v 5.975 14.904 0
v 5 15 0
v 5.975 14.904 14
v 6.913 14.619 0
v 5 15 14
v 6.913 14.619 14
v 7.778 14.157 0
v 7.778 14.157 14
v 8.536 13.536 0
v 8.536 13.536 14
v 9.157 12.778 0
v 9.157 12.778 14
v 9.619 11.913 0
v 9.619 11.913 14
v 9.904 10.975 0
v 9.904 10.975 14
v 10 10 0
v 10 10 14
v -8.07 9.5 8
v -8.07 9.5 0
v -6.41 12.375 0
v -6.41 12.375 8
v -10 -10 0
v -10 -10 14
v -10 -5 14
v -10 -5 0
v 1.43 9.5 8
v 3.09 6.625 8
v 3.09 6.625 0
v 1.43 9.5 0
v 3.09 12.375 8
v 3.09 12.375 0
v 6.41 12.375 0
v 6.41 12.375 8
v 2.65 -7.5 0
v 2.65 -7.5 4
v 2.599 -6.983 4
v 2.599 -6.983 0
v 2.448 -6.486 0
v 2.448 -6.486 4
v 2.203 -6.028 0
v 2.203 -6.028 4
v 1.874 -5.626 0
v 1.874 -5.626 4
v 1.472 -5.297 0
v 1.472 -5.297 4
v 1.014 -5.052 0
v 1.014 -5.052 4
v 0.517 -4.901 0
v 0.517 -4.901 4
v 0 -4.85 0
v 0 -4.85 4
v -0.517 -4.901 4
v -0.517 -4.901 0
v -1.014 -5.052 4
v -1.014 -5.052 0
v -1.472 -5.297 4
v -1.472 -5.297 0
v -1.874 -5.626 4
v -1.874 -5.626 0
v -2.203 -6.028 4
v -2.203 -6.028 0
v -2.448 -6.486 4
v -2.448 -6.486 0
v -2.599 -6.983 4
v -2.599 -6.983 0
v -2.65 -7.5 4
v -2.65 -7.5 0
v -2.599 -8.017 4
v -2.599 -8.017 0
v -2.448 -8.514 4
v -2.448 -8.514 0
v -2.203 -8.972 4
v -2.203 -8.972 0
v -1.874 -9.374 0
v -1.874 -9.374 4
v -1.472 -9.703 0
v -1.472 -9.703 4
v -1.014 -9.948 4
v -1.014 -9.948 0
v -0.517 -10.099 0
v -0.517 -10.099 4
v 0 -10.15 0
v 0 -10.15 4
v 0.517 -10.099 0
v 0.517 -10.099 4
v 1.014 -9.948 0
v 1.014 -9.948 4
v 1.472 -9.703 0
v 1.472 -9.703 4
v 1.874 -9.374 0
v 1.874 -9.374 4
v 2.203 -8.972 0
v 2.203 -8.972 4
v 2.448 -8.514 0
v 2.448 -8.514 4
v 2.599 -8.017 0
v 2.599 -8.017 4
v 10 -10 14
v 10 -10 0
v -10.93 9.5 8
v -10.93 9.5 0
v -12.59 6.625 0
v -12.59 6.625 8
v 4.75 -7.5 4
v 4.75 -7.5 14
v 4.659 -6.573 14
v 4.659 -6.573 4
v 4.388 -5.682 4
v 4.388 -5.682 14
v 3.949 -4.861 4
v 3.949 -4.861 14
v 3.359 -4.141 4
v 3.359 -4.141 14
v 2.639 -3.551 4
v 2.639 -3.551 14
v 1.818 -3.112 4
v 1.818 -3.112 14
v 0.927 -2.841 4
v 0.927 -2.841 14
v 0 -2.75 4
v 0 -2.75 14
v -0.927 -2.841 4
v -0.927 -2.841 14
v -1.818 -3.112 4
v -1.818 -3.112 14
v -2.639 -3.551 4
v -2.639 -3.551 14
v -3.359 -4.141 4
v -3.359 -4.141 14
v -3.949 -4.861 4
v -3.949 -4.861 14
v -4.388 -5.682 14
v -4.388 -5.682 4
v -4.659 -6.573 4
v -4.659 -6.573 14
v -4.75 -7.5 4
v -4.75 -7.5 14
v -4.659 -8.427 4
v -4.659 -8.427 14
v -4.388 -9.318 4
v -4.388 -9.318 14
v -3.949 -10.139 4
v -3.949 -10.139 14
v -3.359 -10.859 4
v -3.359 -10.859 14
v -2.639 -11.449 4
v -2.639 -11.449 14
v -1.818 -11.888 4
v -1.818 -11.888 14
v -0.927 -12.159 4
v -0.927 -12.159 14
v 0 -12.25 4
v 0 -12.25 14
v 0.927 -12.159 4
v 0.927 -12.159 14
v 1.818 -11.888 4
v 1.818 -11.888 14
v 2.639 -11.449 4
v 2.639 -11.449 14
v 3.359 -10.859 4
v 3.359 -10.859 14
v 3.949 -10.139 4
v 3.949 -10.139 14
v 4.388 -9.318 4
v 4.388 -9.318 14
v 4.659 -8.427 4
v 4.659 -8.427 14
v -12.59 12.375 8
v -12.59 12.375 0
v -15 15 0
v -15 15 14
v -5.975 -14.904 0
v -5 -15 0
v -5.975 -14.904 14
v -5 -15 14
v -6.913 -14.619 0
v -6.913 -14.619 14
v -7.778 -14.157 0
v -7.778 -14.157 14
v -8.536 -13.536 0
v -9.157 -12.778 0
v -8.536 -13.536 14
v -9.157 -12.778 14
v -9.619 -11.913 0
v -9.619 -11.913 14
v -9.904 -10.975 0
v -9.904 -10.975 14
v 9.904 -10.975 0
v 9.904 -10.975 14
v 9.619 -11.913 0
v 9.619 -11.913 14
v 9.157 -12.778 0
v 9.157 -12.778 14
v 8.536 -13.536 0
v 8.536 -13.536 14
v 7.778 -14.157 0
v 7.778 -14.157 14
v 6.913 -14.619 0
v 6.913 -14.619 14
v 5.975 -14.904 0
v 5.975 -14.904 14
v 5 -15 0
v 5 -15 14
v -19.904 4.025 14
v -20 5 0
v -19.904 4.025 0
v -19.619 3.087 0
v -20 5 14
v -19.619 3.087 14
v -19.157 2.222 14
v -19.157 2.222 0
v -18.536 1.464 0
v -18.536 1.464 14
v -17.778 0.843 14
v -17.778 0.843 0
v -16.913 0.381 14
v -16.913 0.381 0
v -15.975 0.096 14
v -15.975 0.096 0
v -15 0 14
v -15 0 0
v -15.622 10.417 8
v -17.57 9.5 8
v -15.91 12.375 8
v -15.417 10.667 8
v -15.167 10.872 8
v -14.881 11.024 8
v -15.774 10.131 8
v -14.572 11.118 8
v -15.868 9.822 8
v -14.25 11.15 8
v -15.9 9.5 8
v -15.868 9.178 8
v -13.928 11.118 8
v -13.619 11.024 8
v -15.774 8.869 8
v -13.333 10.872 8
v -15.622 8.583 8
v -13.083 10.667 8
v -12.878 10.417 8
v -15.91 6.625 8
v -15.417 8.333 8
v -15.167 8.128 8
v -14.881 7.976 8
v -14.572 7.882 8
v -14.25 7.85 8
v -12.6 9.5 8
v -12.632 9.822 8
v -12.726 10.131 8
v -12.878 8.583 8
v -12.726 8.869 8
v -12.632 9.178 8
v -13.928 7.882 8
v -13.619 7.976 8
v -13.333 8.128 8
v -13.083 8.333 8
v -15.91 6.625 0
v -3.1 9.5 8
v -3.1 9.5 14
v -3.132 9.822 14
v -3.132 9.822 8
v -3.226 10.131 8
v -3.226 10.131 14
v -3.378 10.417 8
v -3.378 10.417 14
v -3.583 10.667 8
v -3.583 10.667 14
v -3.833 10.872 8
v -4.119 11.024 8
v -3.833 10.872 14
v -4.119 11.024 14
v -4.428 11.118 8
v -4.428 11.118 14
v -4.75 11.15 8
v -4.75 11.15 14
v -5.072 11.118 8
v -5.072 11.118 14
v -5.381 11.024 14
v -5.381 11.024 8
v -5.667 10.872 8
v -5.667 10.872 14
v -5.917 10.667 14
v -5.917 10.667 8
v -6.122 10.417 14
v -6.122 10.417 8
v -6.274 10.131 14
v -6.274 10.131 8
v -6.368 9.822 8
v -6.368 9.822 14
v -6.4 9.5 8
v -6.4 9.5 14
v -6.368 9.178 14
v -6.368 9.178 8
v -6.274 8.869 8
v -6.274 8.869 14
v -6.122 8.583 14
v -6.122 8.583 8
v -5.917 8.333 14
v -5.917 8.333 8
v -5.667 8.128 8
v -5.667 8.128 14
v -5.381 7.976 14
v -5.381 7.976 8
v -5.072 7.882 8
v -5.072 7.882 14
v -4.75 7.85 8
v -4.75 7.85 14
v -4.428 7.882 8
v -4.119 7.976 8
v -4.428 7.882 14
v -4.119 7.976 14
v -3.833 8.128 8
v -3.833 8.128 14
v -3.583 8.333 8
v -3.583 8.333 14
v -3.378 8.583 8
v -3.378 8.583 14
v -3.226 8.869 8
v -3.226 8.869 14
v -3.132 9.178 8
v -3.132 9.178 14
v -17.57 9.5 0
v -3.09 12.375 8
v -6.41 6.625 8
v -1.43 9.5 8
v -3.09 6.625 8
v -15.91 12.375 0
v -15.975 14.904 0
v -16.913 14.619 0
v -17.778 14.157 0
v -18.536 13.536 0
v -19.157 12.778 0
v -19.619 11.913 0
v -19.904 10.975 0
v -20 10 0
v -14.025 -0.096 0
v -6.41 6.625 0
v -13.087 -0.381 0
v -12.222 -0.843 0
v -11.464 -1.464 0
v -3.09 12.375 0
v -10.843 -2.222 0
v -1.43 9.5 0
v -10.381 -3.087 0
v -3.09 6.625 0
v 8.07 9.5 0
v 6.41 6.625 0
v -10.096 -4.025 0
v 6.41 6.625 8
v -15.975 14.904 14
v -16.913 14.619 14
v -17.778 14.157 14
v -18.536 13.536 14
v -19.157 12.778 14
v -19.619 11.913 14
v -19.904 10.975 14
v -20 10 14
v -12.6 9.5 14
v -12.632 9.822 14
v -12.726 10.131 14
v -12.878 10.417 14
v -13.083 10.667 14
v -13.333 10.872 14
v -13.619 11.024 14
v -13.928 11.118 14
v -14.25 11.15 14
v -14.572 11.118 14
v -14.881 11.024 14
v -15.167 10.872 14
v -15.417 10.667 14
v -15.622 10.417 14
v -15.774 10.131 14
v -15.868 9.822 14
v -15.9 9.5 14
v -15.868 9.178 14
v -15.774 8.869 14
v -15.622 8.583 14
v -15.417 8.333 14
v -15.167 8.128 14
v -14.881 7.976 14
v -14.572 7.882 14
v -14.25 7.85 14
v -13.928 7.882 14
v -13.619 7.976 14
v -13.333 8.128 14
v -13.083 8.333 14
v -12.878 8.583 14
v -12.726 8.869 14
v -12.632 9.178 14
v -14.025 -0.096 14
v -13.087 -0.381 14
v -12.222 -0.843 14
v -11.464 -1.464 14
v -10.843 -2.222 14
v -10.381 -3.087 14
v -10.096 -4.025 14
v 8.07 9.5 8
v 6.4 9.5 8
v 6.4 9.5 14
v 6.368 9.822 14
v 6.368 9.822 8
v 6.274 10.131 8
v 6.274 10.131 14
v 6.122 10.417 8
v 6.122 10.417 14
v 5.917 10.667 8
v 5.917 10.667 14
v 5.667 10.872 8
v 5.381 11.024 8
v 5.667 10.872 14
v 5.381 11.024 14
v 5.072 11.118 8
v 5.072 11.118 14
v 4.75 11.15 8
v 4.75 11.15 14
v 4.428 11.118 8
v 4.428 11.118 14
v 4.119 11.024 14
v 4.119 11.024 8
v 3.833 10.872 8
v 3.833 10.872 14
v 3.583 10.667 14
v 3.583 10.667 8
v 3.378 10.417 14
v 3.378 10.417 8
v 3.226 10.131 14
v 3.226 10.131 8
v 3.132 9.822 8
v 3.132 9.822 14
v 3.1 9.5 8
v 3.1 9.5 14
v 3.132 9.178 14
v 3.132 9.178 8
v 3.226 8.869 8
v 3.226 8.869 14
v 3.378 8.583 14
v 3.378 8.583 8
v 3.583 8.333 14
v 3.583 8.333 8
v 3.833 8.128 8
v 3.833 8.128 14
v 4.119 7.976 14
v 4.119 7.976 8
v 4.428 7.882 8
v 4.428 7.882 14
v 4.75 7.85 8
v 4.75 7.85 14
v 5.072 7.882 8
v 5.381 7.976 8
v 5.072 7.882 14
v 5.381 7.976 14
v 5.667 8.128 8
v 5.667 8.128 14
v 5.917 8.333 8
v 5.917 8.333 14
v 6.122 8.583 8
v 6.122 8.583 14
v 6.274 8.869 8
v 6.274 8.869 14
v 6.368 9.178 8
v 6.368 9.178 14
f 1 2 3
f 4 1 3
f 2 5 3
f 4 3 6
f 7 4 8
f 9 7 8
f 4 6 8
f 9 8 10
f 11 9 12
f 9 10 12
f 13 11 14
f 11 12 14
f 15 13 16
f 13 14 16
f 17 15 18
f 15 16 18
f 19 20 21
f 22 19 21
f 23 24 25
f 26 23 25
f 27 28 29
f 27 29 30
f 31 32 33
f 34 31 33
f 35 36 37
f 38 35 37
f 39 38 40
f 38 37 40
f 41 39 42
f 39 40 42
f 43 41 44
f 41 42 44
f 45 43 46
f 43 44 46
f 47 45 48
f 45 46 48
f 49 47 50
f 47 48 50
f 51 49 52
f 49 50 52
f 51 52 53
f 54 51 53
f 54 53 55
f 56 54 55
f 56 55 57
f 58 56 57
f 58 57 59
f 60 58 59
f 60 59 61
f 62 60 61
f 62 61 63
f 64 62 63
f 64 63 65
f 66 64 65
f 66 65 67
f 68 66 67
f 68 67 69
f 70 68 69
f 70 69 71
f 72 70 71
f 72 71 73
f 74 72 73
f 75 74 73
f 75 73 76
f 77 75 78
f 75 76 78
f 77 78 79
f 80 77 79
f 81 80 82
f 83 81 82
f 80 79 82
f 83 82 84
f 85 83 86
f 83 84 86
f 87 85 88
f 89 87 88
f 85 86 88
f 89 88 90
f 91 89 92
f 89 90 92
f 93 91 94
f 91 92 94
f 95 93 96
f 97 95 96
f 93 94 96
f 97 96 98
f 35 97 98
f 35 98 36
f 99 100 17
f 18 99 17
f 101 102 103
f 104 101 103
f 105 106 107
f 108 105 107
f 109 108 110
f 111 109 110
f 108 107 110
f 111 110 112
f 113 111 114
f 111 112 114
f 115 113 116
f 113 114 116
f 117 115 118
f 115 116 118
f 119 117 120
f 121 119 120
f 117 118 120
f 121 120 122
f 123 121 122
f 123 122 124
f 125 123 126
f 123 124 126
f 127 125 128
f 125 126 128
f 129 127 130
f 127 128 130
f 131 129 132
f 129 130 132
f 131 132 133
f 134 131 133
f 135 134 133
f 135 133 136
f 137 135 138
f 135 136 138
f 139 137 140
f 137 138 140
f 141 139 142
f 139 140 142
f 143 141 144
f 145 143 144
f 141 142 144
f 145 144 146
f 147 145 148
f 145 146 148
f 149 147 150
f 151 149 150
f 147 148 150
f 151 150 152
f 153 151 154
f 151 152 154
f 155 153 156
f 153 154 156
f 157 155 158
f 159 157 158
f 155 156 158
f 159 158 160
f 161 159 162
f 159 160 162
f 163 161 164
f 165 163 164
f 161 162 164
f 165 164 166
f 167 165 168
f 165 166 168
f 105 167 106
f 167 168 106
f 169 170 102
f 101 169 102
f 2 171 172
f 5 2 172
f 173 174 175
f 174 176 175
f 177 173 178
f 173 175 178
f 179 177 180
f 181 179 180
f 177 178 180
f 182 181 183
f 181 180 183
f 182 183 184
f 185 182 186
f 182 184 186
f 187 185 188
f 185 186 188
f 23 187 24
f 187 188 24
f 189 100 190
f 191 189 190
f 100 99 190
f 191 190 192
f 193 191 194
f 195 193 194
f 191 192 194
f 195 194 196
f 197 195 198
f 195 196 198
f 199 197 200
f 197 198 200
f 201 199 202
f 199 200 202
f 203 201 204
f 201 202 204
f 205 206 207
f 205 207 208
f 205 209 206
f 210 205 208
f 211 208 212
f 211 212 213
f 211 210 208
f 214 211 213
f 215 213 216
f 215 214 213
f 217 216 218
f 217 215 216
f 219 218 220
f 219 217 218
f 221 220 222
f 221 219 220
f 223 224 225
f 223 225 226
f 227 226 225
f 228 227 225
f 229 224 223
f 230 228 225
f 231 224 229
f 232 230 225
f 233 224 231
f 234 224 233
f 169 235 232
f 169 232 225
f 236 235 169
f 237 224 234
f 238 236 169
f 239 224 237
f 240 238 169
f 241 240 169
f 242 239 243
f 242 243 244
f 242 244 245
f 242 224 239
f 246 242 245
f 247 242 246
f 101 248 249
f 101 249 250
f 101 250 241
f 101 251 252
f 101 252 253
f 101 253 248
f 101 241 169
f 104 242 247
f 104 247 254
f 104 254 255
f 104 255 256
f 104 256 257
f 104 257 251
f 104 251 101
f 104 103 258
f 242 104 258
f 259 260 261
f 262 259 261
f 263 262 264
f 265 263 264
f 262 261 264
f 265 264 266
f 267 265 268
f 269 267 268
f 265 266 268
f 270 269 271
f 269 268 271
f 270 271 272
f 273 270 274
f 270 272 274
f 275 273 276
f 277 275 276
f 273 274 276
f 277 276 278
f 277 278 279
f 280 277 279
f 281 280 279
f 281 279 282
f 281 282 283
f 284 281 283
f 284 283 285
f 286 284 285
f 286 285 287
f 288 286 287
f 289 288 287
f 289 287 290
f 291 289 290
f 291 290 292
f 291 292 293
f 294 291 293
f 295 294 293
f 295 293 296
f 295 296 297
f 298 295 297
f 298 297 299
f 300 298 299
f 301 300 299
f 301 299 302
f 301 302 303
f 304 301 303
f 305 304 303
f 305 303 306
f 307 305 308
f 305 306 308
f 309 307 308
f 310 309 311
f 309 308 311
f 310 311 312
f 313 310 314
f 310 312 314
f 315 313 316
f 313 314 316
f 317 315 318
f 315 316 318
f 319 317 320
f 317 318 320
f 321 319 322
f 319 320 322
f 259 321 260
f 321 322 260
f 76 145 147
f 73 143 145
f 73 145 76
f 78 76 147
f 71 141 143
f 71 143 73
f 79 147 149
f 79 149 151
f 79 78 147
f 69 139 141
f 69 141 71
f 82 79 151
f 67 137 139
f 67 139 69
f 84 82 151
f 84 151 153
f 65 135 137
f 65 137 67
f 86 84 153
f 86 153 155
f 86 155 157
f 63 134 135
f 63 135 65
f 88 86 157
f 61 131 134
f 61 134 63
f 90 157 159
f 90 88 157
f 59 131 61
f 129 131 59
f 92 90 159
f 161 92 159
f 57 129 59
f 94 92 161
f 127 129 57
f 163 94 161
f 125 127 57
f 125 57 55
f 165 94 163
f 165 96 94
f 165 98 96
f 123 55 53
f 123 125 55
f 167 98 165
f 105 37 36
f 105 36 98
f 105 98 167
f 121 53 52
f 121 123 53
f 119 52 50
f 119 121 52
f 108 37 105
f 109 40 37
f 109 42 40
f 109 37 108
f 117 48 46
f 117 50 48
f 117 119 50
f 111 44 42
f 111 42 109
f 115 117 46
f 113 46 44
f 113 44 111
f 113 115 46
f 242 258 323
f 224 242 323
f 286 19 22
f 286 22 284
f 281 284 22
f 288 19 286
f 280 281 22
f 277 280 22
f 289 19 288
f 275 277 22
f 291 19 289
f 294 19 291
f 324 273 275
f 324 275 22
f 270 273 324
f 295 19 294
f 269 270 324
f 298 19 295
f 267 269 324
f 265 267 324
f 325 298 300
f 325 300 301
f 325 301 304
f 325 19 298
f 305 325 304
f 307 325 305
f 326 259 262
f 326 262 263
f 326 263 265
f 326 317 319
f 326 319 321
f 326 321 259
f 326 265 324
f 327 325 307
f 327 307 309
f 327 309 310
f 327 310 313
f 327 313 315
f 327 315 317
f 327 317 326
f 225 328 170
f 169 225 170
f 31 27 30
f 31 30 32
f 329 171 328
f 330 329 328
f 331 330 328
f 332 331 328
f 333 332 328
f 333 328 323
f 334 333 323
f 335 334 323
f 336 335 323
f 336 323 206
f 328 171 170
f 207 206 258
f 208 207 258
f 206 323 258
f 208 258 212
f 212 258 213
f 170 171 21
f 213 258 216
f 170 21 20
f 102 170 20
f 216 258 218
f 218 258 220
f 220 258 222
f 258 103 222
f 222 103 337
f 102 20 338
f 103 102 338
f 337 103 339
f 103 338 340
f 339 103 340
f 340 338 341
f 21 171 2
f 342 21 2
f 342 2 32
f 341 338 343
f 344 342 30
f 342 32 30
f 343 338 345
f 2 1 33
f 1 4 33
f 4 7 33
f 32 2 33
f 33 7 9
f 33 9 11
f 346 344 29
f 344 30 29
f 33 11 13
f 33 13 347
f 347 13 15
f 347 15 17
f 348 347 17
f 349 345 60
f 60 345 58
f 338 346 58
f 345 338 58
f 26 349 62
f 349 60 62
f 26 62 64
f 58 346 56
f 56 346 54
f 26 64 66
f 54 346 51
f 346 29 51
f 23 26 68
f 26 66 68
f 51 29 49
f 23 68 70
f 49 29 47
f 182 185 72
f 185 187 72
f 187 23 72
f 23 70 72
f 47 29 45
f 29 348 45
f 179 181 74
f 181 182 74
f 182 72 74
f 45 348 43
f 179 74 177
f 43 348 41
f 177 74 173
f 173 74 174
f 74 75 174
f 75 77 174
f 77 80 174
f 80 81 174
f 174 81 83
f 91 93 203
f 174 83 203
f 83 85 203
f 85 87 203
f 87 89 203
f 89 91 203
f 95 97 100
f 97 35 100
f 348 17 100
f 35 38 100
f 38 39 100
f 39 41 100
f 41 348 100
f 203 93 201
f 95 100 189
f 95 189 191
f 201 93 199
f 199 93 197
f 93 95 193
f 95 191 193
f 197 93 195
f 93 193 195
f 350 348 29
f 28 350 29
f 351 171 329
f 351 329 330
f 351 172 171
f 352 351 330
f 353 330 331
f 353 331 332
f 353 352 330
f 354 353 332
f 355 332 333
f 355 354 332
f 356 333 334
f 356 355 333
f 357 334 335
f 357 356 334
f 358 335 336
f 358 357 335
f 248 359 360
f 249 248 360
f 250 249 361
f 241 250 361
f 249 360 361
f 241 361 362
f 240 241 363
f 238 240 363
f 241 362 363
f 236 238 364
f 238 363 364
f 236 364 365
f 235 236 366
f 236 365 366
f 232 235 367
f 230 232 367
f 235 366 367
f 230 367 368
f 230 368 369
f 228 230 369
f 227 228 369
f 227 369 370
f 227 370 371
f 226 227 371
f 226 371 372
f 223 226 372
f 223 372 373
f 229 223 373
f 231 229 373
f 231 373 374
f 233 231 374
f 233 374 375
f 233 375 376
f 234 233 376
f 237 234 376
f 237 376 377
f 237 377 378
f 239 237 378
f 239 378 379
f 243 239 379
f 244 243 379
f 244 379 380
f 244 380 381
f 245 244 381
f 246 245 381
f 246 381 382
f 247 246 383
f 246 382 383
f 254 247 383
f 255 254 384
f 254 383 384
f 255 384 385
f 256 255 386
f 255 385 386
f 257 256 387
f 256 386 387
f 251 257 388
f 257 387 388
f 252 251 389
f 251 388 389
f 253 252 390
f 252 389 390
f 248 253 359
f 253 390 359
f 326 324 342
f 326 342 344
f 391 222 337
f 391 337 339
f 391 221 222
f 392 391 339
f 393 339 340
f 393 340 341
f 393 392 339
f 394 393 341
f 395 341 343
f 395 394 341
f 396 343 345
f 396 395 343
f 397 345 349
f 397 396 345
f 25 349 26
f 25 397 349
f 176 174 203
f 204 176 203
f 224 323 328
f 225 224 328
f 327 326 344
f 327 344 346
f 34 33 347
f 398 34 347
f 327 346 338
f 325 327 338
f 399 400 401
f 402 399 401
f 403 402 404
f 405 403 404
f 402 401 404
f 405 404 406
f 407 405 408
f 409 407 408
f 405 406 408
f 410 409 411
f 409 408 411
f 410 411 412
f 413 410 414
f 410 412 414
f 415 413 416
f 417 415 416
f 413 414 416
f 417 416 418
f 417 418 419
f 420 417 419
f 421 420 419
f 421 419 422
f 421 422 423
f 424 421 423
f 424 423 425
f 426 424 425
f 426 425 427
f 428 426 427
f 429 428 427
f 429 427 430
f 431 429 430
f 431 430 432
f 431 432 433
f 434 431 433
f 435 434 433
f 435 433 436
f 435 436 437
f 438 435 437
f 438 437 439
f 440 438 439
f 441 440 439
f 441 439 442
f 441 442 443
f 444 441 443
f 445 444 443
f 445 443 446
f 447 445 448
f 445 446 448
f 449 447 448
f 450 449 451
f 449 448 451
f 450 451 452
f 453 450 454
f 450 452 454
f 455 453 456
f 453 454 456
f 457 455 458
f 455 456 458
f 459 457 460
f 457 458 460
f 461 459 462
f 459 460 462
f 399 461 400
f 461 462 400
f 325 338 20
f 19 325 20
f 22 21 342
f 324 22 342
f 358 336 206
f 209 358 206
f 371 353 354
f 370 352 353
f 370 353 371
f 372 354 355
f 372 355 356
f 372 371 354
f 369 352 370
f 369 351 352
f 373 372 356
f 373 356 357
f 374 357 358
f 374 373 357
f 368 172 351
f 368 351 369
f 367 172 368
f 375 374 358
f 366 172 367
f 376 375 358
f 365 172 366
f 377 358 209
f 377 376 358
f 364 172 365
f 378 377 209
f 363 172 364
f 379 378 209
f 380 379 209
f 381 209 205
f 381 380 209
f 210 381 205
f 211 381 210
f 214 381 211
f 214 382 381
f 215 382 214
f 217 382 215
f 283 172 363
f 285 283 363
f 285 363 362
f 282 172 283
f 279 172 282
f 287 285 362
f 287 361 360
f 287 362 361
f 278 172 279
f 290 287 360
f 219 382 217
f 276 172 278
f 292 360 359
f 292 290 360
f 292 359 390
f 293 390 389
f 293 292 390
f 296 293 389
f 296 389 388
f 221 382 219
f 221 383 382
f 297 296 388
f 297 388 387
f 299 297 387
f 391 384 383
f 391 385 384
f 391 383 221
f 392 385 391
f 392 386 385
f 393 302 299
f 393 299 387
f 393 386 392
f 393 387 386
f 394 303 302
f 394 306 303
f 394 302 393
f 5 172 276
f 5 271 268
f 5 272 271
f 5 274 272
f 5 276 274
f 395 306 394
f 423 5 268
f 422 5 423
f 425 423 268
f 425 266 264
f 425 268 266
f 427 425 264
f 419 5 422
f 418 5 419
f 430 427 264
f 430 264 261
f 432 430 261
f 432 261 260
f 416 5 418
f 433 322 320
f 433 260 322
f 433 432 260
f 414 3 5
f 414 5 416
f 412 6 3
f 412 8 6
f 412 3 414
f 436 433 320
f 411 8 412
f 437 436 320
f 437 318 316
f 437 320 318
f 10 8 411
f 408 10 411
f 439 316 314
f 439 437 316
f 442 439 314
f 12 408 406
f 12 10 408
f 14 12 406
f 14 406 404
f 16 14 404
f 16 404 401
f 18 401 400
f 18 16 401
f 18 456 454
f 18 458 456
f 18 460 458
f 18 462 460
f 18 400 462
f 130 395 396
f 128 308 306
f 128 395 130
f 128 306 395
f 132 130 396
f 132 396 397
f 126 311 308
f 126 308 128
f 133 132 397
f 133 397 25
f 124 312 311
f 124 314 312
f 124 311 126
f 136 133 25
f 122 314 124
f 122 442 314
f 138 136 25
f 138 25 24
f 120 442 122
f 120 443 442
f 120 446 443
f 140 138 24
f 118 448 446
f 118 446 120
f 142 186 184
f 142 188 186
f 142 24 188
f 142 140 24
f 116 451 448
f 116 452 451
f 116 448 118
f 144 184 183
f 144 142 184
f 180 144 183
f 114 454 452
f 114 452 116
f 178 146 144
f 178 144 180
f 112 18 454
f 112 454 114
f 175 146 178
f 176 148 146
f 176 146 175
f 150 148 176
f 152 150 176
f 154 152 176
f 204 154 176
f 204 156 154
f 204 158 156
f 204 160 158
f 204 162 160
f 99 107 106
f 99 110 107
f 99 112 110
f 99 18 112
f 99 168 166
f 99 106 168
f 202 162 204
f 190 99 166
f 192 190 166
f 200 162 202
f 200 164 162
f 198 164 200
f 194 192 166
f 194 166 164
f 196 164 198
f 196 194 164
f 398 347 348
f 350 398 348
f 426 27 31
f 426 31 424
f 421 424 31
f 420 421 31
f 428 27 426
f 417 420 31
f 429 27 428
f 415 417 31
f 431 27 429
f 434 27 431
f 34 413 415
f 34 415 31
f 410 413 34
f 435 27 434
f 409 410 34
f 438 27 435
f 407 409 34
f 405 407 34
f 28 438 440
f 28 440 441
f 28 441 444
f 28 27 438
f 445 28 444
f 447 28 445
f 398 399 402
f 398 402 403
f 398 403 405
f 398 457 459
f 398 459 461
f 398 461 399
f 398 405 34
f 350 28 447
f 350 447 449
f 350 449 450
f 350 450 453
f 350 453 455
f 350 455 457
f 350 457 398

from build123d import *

# Parameters (mm, degrees)
F0_W      = 20
F0_H      = 30
F1_DEPTH  = 14
F2_R      = 2.65
F3_DEPTH  = 14.001
F4_R      = 1.65
F5_DEPTH  = 14.001
F6_W      = 15
F6_H      = 14
F7_DEPTH  = 10
F8_R      = 1.65
F9_DEPTH  = 14.001
F10_R     = 4.99999
F12_DEPTH = 8
F13_R     = 4.75
F14_DEPTH = 10


# Not quite as in the source:
# - a fillet or chamfer is up to 0.001 mm smaller than in the source, because OpenCascade refuses the exact size


with BuildPart() as f1:
    # F0 (on Top) → F1 (new body)
    with BuildSketch(Plane.XY):
        Rectangle(F0_W, F0_H)
    extrude(amount=F1_DEPTH)

    # F2 (on face) → F3 (cut, through all)
    with BuildSketch(Plane.XY.offset(14)):
        with Locations((0, -7.5)):
            Circle(F2_R)
    extrude(amount=-F3_DEPTH, mode=Mode.SUBTRACT)

    # F4 (on face) → F5 (cut, through all)
    with BuildSketch(Plane.XY.offset(14)):
        with Locations((-4.75, 9.5)):
            Circle(F4_R)
        with Locations((4.75, 9.5)):
            Circle(F4_R)
    extrude(amount=-F5_DEPTH, mode=Mode.SUBTRACT)

    # F6 (on face) → F7 (join)
    with BuildSketch(Plane(origin=(-10, 0, 0), x_dir=(0, -1, 0), z_dir=(-1, 0, 0))):
        with Locations((-7.5, 7)):
            Rectangle(F6_W, F6_H)
    extrude(amount=F7_DEPTH)

    # F8 (on face) → F9 (cut, through all)
    with BuildSketch(Plane.XY.offset(14)):
        with Locations((-14.25, 9.5)):
            Circle(F8_R)
    extrude(amount=-F9_DEPTH, mode=Mode.SUBTRACT)

    # F10 (radius 5 in the source; OpenCascade refuses exactly that, so slightly less here)
    f10_edges = [f1.edges().sort_by_distance(p)[0] for p in [
        (-12.6, 9.5, 7),
        (-10, -15, 7),
        (10, -15, 7),
        (-10, 0, 7),
        (-20, 0, 7),
        (-20, 15, 7),
        (10, 15, 7),
    ]]
    fillet(f10_edges, radius=F10_R)

    # F11 (on face) → F12 (cut)
    with BuildSketch(Plane(origin=(0, 0, 0), x_dir=(1, 0, 0), z_dir=(0, 0, -1))):
        Polygon((-17.5697640478, -9.5), (-15.9098820239, -12.375), (-12.5901179761, -12.375), (-10.9302359522, -9.5), (-12.5901179761, -6.625), (-15.9098820239, -6.625), align=None)
        Polygon((3.0901179761, -6.625), (1.4302359522, -9.5), (3.0901179761, -12.375), (6.4098820239, -12.375), (8.0697640478, -9.5), (6.4098820239, -6.625), align=None)
        Polygon((-6.4098820239, -6.625), (-8.0697640478, -9.5), (-6.4098820239, -12.375), (-3.0901179761, -12.375), (-1.4302359522, -9.5), (-3.0901179761, -6.625), align=None)
    extrude(amount=-F12_DEPTH, mode=Mode.SUBTRACT)

    # F13 (on face) → F14 (cut)
    with BuildSketch(Plane.XY.offset(14)):
        with Locations((0, -7.5)):
            Circle(F13_R)
    extrude(amount=-F14_DEPTH, mode=Mode.SUBTRACT)


solid = f1.part
